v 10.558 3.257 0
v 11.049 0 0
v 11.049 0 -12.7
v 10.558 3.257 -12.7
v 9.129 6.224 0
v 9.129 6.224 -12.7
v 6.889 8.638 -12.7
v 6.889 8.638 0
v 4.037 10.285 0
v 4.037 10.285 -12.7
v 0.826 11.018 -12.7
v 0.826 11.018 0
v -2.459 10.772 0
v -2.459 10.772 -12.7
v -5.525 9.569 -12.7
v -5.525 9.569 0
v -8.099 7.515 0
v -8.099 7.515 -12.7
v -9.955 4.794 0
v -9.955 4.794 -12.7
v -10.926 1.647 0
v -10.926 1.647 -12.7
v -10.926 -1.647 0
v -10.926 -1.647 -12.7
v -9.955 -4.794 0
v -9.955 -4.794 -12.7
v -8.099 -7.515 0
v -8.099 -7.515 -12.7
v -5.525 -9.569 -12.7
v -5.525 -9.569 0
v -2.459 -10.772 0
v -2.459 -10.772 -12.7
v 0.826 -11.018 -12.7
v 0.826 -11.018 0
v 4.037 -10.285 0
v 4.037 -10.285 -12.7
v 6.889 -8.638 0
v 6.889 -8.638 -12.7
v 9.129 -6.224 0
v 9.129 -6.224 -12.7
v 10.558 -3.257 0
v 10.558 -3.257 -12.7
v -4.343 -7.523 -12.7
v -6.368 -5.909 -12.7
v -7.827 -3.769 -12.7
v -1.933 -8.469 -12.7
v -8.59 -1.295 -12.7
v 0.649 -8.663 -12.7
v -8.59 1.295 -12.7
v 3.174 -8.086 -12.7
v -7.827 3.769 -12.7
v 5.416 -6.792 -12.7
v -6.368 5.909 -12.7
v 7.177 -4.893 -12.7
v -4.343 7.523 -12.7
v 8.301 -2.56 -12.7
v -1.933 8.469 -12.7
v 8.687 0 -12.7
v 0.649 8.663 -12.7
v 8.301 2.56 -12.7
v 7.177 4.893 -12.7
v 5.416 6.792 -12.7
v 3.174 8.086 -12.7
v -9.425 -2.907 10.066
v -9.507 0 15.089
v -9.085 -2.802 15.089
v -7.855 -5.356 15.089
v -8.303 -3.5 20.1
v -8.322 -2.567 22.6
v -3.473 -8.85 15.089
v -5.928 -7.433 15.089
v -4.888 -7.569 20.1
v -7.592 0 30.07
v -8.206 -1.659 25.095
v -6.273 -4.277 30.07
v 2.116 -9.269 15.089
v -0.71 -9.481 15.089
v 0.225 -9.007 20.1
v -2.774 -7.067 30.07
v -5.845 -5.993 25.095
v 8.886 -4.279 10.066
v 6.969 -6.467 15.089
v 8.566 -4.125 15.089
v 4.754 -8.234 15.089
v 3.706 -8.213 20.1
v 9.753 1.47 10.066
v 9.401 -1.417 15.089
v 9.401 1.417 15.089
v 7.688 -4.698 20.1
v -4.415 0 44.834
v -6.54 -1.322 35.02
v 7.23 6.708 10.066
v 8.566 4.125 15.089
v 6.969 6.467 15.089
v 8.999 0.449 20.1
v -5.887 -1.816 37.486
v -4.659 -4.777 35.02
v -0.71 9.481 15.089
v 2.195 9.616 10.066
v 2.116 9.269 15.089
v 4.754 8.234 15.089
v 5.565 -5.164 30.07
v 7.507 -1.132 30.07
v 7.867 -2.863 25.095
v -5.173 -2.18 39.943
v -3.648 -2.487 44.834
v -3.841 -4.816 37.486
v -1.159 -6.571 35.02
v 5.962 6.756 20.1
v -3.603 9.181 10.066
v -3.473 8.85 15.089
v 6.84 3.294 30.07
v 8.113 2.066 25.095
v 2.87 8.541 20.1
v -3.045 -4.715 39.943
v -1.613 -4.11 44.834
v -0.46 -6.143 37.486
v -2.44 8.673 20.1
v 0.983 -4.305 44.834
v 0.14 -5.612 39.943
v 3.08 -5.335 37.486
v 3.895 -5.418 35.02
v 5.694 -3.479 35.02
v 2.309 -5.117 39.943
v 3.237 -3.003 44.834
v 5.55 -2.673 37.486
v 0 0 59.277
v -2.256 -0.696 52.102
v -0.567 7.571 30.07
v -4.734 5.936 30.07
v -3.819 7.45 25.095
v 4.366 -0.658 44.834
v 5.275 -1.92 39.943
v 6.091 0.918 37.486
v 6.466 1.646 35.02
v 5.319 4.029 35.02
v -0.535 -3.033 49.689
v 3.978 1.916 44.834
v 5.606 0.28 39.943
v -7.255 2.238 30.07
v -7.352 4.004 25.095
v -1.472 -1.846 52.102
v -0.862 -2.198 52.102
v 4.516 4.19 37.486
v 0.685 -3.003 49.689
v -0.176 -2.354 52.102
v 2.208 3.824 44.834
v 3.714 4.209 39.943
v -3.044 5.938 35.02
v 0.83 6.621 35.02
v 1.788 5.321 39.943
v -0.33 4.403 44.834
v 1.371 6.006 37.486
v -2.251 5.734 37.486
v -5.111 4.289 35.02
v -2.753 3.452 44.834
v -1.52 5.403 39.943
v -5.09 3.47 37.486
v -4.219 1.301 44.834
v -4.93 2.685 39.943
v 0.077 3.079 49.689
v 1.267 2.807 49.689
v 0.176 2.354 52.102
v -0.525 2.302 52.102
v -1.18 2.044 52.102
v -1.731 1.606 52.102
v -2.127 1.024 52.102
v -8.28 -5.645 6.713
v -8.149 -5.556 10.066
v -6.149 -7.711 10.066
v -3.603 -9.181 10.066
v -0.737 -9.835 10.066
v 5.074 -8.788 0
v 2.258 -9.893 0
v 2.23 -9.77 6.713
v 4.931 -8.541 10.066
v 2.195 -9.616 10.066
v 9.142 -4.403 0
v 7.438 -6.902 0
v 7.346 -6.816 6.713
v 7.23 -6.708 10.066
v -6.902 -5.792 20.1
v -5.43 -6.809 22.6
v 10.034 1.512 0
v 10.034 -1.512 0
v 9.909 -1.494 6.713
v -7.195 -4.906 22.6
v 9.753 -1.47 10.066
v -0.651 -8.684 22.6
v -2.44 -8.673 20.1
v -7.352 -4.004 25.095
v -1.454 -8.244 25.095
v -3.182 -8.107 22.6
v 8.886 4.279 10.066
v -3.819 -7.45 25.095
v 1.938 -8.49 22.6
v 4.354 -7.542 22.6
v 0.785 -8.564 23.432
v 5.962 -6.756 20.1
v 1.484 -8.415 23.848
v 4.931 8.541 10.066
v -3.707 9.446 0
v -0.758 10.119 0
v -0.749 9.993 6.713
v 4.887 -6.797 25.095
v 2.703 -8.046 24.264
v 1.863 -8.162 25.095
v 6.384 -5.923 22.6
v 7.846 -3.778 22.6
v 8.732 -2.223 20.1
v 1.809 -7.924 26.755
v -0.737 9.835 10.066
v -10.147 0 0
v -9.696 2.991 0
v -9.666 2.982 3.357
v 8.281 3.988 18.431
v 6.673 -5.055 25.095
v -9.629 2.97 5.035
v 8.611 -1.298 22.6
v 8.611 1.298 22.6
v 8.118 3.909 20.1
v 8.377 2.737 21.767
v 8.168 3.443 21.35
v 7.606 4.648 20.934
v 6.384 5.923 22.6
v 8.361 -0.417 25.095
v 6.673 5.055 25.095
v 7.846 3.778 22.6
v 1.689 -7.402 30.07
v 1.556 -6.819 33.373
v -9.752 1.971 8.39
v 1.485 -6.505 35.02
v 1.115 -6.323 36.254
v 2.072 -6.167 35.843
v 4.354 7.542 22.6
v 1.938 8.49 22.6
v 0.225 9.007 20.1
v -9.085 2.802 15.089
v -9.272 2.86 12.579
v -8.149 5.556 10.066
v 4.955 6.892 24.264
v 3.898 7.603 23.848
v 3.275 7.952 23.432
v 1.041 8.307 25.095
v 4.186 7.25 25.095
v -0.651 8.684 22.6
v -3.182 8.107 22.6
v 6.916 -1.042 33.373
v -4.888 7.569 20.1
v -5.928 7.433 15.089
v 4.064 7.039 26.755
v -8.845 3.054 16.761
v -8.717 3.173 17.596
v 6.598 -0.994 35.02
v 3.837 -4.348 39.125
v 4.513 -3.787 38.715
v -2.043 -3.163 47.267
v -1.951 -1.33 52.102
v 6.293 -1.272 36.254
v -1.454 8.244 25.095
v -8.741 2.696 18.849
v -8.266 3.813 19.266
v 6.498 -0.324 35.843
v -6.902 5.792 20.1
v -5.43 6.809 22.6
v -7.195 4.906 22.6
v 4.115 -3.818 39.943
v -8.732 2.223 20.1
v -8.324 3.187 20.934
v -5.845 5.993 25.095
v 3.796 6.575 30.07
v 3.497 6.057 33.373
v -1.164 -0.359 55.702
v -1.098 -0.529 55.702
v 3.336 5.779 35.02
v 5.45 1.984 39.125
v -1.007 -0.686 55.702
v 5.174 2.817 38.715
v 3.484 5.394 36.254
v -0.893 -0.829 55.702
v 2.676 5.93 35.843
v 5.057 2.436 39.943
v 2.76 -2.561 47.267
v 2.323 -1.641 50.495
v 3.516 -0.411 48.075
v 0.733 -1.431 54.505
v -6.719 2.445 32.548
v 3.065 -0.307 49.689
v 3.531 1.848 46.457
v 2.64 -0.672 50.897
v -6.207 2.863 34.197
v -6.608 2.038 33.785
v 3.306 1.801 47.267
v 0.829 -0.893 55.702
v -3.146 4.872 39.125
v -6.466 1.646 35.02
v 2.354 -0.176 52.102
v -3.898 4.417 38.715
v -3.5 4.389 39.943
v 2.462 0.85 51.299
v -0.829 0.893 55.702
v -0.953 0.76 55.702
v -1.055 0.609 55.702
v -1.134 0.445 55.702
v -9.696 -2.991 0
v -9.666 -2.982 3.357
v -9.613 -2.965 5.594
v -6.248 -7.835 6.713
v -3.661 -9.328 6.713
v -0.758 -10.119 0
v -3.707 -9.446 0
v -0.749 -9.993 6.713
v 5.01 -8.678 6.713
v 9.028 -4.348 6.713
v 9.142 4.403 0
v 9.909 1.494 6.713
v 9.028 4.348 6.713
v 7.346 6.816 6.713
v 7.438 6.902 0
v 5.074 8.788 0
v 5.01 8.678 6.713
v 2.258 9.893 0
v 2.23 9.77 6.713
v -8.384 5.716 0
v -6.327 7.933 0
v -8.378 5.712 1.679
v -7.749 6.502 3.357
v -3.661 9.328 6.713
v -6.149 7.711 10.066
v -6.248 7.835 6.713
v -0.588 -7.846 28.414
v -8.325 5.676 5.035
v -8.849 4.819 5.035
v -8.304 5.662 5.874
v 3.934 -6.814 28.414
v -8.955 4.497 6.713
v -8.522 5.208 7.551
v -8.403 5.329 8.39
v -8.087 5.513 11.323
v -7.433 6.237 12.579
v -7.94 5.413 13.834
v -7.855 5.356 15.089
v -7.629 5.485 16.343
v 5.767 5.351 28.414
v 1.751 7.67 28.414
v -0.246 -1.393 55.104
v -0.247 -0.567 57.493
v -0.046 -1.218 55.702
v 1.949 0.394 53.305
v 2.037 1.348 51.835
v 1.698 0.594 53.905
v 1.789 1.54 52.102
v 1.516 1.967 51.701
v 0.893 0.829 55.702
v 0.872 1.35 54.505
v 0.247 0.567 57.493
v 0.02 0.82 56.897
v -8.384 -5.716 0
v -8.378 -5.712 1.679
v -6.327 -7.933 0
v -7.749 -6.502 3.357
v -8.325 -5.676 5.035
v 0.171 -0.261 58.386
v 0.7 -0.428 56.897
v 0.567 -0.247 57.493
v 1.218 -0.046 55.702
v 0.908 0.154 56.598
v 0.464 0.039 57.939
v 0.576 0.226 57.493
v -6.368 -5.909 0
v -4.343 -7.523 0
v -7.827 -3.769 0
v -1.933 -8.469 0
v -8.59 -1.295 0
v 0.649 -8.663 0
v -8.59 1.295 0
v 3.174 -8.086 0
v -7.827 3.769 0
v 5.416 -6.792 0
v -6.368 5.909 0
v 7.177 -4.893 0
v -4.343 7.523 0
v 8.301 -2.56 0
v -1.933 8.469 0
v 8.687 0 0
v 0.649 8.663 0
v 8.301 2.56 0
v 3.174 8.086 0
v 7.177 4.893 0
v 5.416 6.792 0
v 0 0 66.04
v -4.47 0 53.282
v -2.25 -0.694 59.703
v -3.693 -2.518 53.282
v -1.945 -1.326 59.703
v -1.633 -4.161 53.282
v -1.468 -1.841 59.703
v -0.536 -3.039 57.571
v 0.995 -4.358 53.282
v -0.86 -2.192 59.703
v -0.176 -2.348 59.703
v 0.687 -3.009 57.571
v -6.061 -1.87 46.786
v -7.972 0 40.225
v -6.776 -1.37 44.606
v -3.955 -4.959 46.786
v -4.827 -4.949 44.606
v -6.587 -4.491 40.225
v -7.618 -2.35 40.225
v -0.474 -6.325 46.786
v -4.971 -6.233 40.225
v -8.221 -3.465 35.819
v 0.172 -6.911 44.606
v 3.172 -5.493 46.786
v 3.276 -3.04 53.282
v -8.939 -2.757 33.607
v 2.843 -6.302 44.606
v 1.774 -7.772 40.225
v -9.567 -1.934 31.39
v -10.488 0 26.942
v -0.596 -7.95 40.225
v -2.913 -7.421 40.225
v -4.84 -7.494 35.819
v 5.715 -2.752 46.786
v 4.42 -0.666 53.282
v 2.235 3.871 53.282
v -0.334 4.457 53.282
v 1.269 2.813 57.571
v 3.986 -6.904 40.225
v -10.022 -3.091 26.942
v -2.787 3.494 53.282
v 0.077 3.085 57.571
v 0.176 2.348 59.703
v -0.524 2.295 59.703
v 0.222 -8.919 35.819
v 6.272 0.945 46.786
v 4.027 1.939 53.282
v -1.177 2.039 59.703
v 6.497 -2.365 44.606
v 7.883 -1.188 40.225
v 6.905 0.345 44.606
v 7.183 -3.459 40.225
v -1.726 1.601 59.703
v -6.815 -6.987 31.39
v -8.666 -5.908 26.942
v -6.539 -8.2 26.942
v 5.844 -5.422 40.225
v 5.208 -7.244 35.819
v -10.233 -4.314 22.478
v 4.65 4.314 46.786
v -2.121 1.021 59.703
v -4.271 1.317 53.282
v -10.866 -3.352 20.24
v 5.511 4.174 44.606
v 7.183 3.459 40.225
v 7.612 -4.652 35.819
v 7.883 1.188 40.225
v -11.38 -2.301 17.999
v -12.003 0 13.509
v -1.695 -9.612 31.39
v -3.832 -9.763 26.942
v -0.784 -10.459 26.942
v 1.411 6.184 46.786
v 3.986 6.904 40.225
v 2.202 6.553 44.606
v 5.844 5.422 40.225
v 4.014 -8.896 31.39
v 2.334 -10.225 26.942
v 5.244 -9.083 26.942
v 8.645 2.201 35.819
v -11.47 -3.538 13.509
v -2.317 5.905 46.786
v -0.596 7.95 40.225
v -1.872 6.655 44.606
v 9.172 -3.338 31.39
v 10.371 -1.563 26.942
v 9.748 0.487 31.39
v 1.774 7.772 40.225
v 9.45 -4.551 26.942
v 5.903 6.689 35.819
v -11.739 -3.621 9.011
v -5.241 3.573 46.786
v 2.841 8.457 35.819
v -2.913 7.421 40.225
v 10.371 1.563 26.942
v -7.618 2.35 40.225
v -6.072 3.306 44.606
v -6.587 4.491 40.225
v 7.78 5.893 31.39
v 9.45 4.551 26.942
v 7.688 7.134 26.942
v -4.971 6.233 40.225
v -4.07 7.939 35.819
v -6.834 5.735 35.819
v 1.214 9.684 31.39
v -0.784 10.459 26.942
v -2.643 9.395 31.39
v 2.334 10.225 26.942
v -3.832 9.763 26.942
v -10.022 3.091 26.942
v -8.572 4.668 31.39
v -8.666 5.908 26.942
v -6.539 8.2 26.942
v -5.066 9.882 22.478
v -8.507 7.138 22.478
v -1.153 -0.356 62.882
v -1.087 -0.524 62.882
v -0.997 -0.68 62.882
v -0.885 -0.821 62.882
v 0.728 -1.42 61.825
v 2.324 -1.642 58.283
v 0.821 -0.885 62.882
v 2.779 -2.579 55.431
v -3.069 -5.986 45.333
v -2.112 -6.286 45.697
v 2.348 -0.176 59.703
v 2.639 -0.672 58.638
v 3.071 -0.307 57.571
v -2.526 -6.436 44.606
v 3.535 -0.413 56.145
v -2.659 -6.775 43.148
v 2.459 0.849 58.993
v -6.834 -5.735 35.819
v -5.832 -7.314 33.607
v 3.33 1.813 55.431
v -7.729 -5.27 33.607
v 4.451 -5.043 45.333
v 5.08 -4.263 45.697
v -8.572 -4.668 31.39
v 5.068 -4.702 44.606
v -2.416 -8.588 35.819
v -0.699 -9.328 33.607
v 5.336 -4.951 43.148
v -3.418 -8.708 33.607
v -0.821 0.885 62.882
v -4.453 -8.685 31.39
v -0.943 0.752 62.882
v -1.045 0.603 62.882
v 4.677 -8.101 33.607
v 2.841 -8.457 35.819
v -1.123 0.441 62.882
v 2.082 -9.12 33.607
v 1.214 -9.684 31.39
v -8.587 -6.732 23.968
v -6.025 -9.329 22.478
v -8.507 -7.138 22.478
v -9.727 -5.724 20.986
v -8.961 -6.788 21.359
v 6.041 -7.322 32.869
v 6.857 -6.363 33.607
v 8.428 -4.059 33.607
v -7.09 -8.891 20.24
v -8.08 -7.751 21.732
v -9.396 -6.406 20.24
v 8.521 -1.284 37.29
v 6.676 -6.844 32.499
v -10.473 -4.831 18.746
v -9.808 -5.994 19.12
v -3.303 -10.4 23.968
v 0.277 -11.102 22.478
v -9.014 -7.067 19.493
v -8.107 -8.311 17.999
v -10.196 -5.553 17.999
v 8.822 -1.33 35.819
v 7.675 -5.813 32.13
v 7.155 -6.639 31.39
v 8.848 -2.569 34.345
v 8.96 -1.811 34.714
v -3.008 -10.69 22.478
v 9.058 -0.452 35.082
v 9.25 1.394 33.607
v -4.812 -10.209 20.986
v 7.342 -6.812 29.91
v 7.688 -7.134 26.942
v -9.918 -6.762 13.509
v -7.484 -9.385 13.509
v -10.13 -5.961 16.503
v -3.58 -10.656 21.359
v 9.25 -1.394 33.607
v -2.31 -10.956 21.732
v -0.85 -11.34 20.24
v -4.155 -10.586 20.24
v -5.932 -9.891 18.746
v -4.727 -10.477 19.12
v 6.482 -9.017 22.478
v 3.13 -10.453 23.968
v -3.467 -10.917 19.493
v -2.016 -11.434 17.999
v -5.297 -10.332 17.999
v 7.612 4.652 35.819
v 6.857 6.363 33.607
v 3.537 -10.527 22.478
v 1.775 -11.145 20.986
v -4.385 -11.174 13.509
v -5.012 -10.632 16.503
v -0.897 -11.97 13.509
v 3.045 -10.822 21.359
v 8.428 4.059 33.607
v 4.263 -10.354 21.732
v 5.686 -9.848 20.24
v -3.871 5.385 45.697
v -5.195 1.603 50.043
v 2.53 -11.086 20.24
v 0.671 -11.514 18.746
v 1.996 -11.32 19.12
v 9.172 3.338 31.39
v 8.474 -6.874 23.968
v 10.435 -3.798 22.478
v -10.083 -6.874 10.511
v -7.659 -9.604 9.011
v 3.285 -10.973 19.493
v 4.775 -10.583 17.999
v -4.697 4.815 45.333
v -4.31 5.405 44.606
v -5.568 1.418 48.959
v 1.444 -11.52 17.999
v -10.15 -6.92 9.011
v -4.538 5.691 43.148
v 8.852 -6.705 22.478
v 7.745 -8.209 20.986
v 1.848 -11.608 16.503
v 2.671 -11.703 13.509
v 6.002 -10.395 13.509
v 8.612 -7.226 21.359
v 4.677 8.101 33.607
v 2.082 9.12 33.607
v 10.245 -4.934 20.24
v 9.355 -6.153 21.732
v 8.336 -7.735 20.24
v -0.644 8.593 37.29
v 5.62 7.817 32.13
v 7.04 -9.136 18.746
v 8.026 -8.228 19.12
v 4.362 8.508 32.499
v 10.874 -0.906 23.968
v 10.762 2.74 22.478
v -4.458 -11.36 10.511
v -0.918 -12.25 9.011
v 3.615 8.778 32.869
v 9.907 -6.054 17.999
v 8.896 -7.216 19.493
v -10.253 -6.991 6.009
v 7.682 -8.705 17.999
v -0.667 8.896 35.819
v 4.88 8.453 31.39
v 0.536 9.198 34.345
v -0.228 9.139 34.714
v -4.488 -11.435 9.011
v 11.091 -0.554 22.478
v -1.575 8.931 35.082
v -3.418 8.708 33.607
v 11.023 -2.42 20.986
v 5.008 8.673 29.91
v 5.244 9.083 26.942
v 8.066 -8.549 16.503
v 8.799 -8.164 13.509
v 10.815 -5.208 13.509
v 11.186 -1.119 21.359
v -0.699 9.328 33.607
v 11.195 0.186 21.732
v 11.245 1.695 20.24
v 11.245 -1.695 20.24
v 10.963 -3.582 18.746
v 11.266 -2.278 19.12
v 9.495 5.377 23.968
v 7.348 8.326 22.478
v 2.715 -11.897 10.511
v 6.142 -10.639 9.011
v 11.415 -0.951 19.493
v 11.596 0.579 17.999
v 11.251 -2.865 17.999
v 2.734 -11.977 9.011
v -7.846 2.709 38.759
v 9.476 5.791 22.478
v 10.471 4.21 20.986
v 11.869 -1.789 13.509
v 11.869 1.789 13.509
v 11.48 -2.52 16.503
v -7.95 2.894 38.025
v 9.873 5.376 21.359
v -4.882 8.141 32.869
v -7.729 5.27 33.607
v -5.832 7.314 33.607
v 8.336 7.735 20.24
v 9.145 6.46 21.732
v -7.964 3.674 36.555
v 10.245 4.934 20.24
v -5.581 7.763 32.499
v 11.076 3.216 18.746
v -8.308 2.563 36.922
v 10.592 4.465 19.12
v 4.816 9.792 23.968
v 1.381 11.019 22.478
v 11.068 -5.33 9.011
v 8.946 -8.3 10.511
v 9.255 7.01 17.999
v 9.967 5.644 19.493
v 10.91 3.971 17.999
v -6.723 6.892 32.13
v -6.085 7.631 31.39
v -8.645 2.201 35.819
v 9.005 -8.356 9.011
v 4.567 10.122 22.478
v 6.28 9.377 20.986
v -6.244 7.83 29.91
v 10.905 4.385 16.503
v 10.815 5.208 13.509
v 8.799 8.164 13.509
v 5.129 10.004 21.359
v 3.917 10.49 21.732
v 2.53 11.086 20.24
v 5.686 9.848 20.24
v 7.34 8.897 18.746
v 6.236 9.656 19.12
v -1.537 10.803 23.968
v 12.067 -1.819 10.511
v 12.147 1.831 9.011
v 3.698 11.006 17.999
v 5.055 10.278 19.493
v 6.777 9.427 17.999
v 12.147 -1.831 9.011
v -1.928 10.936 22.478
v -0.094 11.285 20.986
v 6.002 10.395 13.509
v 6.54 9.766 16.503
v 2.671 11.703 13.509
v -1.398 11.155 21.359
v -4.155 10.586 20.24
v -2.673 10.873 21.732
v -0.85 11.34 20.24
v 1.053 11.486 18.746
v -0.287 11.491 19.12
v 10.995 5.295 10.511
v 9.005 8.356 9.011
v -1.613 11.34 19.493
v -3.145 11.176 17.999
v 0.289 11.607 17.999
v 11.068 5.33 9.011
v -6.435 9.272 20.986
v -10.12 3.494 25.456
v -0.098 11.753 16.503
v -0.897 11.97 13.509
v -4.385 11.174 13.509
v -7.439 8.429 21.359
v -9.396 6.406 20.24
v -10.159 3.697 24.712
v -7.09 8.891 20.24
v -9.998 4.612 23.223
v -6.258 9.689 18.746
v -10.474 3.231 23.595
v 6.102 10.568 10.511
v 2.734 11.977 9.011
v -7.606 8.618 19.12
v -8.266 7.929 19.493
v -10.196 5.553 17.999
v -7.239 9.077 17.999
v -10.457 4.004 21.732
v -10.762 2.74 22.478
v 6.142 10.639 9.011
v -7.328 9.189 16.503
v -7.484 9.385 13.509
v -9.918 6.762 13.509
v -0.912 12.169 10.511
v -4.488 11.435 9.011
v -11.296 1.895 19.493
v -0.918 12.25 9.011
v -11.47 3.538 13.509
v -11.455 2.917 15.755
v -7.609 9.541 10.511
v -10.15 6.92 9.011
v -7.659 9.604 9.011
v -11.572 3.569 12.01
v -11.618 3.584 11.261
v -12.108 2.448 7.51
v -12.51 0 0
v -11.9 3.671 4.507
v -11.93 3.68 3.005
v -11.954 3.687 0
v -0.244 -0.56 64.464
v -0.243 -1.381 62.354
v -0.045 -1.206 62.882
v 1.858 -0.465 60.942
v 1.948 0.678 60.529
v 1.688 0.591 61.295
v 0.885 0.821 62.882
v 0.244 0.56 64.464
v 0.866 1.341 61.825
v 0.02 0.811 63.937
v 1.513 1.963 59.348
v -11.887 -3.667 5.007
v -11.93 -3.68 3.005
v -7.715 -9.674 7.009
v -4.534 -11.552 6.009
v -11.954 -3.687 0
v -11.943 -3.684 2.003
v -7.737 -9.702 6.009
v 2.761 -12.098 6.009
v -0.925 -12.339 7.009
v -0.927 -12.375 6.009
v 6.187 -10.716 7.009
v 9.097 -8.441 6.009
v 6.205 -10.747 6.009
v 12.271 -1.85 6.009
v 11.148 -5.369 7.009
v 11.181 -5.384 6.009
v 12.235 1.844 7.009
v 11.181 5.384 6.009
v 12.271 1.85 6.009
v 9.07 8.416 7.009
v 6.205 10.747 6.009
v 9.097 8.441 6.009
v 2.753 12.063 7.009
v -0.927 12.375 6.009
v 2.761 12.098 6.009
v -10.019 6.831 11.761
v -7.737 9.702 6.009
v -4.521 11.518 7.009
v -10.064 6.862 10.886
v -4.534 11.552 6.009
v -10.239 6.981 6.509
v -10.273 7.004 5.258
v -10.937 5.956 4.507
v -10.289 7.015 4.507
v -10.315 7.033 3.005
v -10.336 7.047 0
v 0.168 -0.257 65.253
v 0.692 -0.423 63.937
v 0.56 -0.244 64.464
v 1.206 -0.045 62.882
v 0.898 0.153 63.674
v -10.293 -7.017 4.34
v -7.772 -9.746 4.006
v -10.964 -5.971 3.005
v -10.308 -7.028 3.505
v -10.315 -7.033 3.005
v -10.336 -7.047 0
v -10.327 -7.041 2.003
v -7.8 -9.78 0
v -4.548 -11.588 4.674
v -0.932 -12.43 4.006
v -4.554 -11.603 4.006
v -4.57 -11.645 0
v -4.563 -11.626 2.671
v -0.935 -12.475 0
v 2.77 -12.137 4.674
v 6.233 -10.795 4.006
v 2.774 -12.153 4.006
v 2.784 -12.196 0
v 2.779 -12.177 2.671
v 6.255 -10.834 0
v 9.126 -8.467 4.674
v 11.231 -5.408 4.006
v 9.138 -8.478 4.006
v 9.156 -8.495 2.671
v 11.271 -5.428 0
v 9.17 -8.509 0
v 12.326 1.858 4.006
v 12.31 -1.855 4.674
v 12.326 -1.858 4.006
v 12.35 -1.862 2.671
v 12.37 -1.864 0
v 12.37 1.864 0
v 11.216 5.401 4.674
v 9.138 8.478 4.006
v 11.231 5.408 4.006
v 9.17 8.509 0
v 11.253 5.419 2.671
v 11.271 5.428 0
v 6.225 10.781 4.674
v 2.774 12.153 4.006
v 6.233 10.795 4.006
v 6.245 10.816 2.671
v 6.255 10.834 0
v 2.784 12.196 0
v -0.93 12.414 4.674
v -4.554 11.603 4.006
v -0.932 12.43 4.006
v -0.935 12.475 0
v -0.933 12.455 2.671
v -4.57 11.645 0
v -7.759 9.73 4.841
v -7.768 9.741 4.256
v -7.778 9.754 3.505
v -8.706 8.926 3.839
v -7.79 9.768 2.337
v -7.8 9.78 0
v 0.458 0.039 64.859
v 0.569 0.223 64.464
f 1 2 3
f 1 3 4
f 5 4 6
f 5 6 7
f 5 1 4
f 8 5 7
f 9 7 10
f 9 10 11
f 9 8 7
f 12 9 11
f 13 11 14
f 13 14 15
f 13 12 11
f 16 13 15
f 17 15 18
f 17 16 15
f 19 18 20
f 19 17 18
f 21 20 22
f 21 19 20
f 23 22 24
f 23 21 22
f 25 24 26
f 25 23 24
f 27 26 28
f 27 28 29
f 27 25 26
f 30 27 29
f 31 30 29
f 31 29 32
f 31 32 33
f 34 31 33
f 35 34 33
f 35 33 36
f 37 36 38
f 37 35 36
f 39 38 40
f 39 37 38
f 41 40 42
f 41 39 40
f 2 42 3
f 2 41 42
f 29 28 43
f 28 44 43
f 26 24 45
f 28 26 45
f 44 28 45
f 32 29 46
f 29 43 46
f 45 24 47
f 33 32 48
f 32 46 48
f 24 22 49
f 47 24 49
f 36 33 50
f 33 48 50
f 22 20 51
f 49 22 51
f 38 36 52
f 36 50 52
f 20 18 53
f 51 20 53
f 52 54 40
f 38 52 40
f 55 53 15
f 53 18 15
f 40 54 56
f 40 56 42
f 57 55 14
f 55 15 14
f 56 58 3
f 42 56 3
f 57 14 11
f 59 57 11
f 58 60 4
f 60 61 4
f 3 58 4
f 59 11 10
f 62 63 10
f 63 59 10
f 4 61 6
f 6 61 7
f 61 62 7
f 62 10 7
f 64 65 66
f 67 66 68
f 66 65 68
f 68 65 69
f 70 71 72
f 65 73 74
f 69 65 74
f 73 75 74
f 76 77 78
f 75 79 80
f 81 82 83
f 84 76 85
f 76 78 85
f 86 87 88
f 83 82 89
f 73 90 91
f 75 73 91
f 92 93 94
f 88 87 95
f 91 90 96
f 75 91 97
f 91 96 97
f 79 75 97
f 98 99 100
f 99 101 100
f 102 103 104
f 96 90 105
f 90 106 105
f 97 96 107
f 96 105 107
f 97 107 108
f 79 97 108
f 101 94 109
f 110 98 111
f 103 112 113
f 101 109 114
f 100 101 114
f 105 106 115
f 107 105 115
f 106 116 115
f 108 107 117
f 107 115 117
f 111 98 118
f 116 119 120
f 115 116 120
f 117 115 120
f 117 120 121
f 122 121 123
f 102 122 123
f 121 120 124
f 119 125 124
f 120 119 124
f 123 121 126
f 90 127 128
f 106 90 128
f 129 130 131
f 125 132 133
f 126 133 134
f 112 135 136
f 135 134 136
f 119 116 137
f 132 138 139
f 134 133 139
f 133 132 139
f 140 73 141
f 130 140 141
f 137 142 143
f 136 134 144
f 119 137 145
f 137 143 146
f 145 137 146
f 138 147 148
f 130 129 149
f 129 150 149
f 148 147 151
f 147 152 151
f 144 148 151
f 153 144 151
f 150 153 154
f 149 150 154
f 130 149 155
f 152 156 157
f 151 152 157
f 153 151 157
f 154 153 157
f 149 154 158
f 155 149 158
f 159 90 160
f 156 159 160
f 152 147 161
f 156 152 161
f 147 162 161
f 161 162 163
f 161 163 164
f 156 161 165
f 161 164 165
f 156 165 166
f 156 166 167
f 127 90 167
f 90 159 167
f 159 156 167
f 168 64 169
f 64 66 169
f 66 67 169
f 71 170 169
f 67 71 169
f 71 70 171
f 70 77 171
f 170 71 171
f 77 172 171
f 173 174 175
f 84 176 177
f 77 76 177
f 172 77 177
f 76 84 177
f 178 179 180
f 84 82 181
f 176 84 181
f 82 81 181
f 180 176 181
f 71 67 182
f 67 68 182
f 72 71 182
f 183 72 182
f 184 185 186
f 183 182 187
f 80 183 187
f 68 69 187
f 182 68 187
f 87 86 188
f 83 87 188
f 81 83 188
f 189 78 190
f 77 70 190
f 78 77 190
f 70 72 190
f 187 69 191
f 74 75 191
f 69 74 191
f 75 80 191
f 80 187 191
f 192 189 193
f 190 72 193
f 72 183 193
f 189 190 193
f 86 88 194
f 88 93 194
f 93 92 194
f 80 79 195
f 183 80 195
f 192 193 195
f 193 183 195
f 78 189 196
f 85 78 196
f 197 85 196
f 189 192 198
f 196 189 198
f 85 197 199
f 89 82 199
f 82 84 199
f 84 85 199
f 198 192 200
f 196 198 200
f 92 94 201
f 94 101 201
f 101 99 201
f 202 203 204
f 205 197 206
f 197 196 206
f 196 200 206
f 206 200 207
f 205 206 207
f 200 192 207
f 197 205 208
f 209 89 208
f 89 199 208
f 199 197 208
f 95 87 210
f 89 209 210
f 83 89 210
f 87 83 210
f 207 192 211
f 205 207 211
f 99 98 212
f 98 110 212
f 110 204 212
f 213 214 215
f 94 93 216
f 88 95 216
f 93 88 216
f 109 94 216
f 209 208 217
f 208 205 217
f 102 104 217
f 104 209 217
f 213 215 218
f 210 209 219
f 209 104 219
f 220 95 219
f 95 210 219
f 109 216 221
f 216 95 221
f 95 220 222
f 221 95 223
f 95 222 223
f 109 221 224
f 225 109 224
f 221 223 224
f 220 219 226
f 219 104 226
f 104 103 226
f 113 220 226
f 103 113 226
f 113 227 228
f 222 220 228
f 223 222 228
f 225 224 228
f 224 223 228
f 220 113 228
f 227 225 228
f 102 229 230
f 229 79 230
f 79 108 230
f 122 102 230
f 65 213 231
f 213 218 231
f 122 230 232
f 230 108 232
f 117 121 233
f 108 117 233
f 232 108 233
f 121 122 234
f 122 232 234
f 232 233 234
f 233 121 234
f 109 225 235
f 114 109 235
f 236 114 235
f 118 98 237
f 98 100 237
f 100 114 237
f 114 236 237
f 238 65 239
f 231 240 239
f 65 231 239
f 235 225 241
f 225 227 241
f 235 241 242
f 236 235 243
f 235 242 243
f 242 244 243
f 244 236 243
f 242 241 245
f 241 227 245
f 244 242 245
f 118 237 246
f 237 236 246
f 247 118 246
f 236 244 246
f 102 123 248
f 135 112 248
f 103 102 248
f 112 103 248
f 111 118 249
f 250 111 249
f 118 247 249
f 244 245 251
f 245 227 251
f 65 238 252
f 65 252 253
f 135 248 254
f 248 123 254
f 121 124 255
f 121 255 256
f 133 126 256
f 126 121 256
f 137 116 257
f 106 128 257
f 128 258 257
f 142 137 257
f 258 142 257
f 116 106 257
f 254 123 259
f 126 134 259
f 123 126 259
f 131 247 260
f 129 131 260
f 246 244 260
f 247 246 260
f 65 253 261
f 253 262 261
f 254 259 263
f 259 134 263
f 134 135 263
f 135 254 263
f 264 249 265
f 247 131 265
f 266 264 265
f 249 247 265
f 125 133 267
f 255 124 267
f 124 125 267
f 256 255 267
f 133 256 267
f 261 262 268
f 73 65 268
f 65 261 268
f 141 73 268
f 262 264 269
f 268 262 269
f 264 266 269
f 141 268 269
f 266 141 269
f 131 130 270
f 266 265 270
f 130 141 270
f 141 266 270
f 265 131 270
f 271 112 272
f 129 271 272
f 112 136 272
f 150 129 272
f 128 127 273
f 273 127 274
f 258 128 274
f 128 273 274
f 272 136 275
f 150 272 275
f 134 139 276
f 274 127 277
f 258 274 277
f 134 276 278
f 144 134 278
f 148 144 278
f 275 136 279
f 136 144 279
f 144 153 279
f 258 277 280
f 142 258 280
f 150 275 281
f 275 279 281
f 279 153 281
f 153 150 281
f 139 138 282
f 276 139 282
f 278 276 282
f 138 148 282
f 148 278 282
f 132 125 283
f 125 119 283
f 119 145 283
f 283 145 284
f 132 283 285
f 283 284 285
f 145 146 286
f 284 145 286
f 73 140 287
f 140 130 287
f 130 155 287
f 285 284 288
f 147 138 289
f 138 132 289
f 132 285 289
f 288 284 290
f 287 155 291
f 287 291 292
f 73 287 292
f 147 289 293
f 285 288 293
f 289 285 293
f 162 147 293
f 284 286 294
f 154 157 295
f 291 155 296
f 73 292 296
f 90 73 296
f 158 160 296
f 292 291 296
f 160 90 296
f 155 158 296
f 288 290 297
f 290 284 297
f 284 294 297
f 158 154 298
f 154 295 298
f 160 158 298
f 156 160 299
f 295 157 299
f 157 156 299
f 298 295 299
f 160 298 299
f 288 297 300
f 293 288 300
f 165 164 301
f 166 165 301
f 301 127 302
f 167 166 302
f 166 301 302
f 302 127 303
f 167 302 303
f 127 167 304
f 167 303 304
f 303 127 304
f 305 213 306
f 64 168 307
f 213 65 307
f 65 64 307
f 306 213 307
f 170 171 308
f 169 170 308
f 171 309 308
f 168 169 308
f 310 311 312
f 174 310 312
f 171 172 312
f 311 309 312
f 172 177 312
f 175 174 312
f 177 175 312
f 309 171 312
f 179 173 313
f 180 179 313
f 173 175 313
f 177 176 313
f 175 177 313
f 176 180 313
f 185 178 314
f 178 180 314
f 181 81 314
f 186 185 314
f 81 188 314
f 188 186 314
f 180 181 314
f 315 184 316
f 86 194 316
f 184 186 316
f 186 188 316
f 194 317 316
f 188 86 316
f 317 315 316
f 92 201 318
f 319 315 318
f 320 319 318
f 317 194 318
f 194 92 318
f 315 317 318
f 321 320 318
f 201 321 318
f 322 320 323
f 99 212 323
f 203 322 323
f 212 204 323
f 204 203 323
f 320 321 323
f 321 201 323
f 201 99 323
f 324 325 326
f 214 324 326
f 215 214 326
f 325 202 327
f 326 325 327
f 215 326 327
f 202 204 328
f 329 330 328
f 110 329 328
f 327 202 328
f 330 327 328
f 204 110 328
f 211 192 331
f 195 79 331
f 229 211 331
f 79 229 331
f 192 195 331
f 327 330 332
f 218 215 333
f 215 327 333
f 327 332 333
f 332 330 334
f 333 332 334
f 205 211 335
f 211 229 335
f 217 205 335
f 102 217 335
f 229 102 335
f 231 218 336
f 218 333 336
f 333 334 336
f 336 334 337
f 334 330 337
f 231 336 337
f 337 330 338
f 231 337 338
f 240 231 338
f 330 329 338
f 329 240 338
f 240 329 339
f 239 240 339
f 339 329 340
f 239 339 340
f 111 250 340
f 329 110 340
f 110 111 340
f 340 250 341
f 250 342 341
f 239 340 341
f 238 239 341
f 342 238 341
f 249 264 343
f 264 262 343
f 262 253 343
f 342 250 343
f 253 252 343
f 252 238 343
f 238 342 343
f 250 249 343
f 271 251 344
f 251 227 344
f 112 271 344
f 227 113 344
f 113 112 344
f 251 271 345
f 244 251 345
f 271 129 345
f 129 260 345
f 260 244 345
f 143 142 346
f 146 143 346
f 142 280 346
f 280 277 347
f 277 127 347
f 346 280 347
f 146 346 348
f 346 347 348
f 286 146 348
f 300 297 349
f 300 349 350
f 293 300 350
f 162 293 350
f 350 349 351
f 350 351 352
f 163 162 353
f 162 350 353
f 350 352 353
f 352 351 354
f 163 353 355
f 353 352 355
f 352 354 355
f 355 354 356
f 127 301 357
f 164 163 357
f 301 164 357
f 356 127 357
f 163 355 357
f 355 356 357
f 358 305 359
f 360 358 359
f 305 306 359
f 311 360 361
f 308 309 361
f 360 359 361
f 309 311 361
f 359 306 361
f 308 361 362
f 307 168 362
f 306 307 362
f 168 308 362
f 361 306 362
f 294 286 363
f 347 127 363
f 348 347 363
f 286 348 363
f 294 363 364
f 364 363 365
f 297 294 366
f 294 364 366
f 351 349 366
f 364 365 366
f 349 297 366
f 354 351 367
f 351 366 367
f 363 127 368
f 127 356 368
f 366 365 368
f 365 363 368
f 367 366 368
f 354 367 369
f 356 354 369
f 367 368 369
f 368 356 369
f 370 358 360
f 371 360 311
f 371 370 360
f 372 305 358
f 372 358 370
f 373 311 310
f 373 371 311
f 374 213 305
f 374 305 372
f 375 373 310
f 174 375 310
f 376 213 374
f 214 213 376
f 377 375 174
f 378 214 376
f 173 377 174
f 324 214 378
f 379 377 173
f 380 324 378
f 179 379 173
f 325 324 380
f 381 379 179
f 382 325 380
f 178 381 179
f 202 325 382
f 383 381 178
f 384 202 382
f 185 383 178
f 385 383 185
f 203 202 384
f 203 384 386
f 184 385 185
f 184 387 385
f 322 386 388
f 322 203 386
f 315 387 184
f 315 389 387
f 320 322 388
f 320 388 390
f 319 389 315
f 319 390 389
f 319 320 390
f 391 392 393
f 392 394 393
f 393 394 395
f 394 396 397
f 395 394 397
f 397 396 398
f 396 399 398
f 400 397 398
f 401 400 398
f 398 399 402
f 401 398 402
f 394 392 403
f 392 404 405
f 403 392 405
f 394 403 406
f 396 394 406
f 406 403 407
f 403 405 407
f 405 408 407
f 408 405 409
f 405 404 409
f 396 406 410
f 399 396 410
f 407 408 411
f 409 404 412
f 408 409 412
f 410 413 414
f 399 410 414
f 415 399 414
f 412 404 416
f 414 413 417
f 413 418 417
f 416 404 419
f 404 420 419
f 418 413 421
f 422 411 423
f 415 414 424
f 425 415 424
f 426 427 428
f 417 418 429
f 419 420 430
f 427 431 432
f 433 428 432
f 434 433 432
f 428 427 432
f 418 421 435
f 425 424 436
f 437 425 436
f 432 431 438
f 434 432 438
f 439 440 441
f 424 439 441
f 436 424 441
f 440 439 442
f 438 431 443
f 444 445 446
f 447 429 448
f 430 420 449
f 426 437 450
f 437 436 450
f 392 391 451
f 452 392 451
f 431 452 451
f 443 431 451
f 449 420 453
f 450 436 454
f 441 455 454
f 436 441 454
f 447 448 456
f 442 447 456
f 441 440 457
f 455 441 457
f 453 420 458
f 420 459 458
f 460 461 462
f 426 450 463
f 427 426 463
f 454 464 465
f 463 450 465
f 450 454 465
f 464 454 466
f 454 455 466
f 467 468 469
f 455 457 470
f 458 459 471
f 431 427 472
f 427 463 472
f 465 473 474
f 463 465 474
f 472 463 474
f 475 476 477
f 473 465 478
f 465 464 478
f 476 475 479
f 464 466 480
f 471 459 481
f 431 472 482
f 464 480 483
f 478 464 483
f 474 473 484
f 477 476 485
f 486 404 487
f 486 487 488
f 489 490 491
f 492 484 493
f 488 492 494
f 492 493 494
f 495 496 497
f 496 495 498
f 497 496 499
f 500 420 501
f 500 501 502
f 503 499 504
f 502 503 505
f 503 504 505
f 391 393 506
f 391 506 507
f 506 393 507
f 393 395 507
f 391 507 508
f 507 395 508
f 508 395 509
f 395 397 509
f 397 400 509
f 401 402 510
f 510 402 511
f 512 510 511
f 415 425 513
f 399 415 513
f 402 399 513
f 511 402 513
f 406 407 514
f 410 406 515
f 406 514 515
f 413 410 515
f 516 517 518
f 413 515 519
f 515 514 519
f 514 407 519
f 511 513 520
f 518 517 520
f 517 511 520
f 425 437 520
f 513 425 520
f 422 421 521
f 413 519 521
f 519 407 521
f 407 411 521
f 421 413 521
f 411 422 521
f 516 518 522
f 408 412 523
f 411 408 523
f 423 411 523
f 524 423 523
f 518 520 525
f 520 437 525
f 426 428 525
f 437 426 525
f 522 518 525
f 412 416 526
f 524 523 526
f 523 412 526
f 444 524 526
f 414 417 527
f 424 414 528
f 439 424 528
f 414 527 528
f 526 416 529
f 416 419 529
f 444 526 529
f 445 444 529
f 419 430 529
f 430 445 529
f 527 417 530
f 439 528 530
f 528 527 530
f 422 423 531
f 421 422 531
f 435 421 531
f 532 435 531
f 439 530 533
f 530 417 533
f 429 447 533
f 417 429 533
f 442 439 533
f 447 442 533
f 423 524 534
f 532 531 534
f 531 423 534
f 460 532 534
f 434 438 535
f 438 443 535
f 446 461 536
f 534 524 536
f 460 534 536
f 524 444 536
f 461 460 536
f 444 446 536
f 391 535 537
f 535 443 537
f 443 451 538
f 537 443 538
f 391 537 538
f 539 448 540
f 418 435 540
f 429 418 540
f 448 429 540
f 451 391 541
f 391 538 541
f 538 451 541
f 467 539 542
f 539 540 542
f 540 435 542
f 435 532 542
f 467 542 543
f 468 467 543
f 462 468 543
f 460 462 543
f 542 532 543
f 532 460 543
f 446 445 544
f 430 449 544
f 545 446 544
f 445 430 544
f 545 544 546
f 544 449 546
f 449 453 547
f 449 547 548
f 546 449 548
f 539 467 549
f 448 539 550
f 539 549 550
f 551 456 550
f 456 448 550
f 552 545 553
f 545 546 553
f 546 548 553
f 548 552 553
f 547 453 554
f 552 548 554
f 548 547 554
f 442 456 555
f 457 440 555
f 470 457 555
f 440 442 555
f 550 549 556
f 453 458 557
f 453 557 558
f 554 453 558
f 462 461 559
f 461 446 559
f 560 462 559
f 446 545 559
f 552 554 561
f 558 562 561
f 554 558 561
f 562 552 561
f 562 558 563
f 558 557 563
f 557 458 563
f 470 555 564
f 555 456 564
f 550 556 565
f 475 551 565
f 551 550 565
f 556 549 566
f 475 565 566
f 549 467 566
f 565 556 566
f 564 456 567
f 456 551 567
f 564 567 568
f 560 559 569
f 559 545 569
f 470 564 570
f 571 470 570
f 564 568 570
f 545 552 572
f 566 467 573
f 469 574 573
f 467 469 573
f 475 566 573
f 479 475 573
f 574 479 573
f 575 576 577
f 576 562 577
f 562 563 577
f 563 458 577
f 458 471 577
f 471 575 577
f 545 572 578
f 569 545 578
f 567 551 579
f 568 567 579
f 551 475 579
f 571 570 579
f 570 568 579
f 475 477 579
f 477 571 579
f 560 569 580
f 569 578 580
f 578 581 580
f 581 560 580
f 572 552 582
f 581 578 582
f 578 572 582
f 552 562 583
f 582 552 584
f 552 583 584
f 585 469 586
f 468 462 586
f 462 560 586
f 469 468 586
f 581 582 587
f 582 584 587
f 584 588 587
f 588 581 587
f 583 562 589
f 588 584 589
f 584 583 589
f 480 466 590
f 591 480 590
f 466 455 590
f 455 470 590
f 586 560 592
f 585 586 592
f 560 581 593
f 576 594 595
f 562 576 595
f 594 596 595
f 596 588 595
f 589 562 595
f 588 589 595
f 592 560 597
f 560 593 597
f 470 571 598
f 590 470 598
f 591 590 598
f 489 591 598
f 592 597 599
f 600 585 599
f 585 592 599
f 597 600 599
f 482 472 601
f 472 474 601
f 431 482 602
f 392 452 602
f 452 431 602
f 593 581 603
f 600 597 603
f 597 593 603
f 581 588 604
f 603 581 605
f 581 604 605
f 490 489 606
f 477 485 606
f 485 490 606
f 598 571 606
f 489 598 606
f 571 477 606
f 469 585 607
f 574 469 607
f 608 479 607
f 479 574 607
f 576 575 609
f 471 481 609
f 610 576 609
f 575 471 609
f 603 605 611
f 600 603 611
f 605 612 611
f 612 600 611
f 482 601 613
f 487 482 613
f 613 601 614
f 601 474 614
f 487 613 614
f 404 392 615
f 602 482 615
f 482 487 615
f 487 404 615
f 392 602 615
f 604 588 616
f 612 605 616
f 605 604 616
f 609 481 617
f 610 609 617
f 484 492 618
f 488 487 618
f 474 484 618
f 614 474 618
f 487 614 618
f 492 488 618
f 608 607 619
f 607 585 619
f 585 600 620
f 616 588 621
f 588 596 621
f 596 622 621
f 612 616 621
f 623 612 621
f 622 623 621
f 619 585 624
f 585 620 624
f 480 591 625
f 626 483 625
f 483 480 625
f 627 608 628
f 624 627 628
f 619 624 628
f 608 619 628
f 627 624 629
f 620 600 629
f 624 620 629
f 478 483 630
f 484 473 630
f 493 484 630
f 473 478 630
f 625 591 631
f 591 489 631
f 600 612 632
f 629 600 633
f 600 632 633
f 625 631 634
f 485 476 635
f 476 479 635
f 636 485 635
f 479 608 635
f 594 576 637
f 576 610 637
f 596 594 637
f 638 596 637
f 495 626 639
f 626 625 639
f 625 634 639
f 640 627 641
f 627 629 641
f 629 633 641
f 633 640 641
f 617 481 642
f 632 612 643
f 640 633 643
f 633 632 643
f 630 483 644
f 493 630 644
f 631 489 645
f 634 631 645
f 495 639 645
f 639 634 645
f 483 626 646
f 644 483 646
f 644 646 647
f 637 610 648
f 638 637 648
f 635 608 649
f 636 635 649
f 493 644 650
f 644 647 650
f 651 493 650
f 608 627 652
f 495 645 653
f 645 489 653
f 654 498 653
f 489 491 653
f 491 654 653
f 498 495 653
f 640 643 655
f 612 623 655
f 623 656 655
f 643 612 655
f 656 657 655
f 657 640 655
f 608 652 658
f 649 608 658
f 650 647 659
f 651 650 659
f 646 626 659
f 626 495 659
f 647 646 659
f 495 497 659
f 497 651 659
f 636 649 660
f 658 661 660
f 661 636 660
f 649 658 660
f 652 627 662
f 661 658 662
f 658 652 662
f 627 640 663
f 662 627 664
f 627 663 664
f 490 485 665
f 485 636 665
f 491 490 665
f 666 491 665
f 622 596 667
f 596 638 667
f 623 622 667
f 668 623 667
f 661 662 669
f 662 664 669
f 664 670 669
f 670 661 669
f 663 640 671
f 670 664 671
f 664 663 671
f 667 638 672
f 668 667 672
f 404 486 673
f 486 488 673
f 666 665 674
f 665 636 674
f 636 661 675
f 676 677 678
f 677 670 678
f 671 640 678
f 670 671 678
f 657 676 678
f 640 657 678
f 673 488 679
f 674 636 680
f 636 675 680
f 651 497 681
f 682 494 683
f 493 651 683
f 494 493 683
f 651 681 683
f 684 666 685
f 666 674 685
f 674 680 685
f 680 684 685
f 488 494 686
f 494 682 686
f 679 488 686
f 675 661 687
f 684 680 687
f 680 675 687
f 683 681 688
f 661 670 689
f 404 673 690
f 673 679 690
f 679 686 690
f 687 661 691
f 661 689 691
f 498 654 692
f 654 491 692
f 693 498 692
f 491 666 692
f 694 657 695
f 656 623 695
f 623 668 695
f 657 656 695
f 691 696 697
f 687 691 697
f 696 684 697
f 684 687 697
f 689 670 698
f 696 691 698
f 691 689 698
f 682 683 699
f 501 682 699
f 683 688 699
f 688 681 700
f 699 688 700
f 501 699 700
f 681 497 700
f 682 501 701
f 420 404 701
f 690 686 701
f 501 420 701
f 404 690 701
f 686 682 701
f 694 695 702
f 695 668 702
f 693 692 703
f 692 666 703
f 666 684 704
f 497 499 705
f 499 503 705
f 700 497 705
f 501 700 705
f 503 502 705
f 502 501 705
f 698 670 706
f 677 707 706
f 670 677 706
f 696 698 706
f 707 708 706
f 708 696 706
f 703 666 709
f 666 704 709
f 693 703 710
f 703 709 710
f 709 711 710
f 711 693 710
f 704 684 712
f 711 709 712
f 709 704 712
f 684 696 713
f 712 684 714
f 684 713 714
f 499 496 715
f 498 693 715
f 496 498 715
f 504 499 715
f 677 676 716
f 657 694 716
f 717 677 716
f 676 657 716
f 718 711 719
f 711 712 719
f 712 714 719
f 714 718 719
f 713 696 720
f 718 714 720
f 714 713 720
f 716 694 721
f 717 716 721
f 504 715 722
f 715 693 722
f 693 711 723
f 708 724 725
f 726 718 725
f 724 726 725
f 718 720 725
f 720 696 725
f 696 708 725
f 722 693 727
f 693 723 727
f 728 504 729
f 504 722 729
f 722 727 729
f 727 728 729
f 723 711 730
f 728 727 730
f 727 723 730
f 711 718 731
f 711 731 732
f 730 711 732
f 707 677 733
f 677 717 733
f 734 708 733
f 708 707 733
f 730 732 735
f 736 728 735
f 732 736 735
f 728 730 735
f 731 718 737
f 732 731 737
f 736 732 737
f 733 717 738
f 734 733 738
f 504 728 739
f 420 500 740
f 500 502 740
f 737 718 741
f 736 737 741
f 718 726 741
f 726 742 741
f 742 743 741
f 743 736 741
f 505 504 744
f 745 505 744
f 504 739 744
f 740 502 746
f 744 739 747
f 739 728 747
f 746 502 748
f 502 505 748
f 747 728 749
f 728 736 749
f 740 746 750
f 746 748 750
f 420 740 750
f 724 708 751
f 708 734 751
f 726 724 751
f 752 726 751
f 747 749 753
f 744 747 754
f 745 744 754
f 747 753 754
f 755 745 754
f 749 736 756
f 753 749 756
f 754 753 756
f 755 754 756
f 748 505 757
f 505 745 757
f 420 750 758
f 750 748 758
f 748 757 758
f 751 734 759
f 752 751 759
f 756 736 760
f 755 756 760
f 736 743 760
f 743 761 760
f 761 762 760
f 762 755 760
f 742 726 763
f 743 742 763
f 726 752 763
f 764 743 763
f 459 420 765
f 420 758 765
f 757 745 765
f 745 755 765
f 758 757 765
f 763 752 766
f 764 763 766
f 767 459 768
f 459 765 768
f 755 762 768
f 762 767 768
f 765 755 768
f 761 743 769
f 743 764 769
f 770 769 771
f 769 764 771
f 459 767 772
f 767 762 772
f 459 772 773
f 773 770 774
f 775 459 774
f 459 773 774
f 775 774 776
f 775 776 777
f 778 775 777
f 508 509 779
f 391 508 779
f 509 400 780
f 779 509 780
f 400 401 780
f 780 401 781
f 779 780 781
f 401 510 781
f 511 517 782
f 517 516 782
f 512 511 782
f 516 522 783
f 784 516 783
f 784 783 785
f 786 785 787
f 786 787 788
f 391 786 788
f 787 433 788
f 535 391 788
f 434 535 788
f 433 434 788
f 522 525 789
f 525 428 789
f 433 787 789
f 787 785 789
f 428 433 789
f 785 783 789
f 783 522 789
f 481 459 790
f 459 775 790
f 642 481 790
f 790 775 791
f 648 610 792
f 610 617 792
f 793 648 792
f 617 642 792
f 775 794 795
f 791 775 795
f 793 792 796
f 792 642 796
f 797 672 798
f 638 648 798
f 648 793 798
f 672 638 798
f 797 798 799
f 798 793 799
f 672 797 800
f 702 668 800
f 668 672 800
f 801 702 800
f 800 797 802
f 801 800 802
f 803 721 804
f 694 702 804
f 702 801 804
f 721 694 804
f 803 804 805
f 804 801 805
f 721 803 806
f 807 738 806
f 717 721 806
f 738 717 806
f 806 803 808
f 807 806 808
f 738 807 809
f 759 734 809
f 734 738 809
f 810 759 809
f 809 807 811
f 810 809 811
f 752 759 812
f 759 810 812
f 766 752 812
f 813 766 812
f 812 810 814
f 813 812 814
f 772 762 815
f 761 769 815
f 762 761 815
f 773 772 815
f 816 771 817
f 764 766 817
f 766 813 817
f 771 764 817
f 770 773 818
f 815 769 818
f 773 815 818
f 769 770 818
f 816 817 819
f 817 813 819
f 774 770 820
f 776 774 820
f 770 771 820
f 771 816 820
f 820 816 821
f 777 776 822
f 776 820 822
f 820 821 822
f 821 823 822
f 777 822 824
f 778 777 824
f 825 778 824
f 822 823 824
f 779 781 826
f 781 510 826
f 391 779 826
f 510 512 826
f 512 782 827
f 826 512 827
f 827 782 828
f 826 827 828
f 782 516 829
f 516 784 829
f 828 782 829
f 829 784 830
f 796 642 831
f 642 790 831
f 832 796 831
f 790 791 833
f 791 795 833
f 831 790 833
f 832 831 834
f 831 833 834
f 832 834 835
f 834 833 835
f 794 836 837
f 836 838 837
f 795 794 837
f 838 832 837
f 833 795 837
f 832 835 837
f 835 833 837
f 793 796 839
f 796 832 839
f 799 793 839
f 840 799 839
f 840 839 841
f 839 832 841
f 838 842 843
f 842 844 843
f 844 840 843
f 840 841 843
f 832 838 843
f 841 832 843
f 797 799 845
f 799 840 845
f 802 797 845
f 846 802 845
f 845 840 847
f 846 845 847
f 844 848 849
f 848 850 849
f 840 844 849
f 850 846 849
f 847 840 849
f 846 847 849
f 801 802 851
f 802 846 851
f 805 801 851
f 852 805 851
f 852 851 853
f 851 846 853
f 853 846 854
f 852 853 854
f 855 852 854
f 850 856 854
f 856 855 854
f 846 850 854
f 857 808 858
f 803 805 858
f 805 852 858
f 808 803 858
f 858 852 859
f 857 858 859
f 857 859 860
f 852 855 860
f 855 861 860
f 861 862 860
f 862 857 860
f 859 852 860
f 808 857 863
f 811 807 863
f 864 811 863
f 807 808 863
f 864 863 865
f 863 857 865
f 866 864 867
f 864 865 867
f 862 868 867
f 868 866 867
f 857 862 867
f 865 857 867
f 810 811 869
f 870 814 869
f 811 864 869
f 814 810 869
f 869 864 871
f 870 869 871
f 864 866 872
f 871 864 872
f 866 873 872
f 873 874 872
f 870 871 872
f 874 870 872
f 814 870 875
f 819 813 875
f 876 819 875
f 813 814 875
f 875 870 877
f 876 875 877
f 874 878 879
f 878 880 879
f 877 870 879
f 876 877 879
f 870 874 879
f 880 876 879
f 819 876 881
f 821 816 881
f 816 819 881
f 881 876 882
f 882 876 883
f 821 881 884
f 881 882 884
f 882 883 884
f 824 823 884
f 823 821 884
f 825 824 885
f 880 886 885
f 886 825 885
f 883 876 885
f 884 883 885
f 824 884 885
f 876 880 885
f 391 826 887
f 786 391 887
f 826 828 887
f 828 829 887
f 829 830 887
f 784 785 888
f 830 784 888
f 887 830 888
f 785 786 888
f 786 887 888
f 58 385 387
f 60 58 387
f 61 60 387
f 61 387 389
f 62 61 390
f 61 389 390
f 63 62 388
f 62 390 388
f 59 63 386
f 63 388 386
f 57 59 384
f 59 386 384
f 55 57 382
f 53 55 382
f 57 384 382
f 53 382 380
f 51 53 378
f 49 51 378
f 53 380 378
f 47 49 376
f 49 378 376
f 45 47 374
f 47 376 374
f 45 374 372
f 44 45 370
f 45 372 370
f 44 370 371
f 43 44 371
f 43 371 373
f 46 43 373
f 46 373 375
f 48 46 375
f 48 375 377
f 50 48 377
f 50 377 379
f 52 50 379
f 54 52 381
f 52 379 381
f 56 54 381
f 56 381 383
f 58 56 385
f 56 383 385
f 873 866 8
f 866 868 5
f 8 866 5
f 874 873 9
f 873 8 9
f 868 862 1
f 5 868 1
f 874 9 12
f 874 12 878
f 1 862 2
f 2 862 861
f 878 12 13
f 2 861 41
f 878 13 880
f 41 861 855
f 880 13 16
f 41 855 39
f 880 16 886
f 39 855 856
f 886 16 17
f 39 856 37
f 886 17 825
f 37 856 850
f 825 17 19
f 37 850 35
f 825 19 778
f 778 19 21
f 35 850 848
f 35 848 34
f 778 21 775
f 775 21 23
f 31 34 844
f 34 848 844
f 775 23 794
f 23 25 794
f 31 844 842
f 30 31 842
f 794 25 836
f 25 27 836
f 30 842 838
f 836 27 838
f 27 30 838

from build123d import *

# Parameters (mm, degrees)
F2_R     = 11.049
F2_R_2   = 8.6868
F3_DEPTH = 12.7
F7_DEPTH = 3.302


# Not quite as in the source:
# - the program builds the solid bodies; features that only make, move or delete a surface that nothing else refers to are left out


with BuildPart() as f1:
    # F0 (on Front) → F1 (revolve)
    with BuildSketch(Plane.XZ):
        with BuildLine():
            Line((0, 59.2769769434), (0, 66.04))
            ThreePointArc((0, 66.04), (-9.3545638677, 33.6071762807), (-12.5095, 0))
            Line((-12.5095, 0), (-10.1473, 0))
            ThreePointArc((-10.1473, 0), (-7.5921575539, 30.0696179426), (0, 59.2769769434))
        make_face()
    revolve(axis=Axis((0, 0, 62.6584884717), (0, 0, 1)))

    # F2 (on Top) → F3 (join)
    with BuildSketch(Plane.XY):
        Circle(F2_R)
        Circle(F2_R_2, mode=Mode.SUBTRACT)
    extrude(amount=-F3_DEPTH)

    # F6 (on Front) → F7 (cut, symmetric)
    with BuildSketch(Plane.XZ):
        with BuildLine():
            ThreePointArc((6.9723, 0), (5.2204583943, 24.7022854782), (0, 48.9101079951))
            ThreePointArc((0, 48.9101079951), (-5.2204583943, 24.7022854782), (-6.9723, 0))
            Line((-6.9723, 0), (0, 0))
            Line((0, 0), (6.9723, 0))
        make_face()
    extrude(amount=F7_DEPTH, both=True, mode=Mode.SUBTRACT)


solid = f1.part
